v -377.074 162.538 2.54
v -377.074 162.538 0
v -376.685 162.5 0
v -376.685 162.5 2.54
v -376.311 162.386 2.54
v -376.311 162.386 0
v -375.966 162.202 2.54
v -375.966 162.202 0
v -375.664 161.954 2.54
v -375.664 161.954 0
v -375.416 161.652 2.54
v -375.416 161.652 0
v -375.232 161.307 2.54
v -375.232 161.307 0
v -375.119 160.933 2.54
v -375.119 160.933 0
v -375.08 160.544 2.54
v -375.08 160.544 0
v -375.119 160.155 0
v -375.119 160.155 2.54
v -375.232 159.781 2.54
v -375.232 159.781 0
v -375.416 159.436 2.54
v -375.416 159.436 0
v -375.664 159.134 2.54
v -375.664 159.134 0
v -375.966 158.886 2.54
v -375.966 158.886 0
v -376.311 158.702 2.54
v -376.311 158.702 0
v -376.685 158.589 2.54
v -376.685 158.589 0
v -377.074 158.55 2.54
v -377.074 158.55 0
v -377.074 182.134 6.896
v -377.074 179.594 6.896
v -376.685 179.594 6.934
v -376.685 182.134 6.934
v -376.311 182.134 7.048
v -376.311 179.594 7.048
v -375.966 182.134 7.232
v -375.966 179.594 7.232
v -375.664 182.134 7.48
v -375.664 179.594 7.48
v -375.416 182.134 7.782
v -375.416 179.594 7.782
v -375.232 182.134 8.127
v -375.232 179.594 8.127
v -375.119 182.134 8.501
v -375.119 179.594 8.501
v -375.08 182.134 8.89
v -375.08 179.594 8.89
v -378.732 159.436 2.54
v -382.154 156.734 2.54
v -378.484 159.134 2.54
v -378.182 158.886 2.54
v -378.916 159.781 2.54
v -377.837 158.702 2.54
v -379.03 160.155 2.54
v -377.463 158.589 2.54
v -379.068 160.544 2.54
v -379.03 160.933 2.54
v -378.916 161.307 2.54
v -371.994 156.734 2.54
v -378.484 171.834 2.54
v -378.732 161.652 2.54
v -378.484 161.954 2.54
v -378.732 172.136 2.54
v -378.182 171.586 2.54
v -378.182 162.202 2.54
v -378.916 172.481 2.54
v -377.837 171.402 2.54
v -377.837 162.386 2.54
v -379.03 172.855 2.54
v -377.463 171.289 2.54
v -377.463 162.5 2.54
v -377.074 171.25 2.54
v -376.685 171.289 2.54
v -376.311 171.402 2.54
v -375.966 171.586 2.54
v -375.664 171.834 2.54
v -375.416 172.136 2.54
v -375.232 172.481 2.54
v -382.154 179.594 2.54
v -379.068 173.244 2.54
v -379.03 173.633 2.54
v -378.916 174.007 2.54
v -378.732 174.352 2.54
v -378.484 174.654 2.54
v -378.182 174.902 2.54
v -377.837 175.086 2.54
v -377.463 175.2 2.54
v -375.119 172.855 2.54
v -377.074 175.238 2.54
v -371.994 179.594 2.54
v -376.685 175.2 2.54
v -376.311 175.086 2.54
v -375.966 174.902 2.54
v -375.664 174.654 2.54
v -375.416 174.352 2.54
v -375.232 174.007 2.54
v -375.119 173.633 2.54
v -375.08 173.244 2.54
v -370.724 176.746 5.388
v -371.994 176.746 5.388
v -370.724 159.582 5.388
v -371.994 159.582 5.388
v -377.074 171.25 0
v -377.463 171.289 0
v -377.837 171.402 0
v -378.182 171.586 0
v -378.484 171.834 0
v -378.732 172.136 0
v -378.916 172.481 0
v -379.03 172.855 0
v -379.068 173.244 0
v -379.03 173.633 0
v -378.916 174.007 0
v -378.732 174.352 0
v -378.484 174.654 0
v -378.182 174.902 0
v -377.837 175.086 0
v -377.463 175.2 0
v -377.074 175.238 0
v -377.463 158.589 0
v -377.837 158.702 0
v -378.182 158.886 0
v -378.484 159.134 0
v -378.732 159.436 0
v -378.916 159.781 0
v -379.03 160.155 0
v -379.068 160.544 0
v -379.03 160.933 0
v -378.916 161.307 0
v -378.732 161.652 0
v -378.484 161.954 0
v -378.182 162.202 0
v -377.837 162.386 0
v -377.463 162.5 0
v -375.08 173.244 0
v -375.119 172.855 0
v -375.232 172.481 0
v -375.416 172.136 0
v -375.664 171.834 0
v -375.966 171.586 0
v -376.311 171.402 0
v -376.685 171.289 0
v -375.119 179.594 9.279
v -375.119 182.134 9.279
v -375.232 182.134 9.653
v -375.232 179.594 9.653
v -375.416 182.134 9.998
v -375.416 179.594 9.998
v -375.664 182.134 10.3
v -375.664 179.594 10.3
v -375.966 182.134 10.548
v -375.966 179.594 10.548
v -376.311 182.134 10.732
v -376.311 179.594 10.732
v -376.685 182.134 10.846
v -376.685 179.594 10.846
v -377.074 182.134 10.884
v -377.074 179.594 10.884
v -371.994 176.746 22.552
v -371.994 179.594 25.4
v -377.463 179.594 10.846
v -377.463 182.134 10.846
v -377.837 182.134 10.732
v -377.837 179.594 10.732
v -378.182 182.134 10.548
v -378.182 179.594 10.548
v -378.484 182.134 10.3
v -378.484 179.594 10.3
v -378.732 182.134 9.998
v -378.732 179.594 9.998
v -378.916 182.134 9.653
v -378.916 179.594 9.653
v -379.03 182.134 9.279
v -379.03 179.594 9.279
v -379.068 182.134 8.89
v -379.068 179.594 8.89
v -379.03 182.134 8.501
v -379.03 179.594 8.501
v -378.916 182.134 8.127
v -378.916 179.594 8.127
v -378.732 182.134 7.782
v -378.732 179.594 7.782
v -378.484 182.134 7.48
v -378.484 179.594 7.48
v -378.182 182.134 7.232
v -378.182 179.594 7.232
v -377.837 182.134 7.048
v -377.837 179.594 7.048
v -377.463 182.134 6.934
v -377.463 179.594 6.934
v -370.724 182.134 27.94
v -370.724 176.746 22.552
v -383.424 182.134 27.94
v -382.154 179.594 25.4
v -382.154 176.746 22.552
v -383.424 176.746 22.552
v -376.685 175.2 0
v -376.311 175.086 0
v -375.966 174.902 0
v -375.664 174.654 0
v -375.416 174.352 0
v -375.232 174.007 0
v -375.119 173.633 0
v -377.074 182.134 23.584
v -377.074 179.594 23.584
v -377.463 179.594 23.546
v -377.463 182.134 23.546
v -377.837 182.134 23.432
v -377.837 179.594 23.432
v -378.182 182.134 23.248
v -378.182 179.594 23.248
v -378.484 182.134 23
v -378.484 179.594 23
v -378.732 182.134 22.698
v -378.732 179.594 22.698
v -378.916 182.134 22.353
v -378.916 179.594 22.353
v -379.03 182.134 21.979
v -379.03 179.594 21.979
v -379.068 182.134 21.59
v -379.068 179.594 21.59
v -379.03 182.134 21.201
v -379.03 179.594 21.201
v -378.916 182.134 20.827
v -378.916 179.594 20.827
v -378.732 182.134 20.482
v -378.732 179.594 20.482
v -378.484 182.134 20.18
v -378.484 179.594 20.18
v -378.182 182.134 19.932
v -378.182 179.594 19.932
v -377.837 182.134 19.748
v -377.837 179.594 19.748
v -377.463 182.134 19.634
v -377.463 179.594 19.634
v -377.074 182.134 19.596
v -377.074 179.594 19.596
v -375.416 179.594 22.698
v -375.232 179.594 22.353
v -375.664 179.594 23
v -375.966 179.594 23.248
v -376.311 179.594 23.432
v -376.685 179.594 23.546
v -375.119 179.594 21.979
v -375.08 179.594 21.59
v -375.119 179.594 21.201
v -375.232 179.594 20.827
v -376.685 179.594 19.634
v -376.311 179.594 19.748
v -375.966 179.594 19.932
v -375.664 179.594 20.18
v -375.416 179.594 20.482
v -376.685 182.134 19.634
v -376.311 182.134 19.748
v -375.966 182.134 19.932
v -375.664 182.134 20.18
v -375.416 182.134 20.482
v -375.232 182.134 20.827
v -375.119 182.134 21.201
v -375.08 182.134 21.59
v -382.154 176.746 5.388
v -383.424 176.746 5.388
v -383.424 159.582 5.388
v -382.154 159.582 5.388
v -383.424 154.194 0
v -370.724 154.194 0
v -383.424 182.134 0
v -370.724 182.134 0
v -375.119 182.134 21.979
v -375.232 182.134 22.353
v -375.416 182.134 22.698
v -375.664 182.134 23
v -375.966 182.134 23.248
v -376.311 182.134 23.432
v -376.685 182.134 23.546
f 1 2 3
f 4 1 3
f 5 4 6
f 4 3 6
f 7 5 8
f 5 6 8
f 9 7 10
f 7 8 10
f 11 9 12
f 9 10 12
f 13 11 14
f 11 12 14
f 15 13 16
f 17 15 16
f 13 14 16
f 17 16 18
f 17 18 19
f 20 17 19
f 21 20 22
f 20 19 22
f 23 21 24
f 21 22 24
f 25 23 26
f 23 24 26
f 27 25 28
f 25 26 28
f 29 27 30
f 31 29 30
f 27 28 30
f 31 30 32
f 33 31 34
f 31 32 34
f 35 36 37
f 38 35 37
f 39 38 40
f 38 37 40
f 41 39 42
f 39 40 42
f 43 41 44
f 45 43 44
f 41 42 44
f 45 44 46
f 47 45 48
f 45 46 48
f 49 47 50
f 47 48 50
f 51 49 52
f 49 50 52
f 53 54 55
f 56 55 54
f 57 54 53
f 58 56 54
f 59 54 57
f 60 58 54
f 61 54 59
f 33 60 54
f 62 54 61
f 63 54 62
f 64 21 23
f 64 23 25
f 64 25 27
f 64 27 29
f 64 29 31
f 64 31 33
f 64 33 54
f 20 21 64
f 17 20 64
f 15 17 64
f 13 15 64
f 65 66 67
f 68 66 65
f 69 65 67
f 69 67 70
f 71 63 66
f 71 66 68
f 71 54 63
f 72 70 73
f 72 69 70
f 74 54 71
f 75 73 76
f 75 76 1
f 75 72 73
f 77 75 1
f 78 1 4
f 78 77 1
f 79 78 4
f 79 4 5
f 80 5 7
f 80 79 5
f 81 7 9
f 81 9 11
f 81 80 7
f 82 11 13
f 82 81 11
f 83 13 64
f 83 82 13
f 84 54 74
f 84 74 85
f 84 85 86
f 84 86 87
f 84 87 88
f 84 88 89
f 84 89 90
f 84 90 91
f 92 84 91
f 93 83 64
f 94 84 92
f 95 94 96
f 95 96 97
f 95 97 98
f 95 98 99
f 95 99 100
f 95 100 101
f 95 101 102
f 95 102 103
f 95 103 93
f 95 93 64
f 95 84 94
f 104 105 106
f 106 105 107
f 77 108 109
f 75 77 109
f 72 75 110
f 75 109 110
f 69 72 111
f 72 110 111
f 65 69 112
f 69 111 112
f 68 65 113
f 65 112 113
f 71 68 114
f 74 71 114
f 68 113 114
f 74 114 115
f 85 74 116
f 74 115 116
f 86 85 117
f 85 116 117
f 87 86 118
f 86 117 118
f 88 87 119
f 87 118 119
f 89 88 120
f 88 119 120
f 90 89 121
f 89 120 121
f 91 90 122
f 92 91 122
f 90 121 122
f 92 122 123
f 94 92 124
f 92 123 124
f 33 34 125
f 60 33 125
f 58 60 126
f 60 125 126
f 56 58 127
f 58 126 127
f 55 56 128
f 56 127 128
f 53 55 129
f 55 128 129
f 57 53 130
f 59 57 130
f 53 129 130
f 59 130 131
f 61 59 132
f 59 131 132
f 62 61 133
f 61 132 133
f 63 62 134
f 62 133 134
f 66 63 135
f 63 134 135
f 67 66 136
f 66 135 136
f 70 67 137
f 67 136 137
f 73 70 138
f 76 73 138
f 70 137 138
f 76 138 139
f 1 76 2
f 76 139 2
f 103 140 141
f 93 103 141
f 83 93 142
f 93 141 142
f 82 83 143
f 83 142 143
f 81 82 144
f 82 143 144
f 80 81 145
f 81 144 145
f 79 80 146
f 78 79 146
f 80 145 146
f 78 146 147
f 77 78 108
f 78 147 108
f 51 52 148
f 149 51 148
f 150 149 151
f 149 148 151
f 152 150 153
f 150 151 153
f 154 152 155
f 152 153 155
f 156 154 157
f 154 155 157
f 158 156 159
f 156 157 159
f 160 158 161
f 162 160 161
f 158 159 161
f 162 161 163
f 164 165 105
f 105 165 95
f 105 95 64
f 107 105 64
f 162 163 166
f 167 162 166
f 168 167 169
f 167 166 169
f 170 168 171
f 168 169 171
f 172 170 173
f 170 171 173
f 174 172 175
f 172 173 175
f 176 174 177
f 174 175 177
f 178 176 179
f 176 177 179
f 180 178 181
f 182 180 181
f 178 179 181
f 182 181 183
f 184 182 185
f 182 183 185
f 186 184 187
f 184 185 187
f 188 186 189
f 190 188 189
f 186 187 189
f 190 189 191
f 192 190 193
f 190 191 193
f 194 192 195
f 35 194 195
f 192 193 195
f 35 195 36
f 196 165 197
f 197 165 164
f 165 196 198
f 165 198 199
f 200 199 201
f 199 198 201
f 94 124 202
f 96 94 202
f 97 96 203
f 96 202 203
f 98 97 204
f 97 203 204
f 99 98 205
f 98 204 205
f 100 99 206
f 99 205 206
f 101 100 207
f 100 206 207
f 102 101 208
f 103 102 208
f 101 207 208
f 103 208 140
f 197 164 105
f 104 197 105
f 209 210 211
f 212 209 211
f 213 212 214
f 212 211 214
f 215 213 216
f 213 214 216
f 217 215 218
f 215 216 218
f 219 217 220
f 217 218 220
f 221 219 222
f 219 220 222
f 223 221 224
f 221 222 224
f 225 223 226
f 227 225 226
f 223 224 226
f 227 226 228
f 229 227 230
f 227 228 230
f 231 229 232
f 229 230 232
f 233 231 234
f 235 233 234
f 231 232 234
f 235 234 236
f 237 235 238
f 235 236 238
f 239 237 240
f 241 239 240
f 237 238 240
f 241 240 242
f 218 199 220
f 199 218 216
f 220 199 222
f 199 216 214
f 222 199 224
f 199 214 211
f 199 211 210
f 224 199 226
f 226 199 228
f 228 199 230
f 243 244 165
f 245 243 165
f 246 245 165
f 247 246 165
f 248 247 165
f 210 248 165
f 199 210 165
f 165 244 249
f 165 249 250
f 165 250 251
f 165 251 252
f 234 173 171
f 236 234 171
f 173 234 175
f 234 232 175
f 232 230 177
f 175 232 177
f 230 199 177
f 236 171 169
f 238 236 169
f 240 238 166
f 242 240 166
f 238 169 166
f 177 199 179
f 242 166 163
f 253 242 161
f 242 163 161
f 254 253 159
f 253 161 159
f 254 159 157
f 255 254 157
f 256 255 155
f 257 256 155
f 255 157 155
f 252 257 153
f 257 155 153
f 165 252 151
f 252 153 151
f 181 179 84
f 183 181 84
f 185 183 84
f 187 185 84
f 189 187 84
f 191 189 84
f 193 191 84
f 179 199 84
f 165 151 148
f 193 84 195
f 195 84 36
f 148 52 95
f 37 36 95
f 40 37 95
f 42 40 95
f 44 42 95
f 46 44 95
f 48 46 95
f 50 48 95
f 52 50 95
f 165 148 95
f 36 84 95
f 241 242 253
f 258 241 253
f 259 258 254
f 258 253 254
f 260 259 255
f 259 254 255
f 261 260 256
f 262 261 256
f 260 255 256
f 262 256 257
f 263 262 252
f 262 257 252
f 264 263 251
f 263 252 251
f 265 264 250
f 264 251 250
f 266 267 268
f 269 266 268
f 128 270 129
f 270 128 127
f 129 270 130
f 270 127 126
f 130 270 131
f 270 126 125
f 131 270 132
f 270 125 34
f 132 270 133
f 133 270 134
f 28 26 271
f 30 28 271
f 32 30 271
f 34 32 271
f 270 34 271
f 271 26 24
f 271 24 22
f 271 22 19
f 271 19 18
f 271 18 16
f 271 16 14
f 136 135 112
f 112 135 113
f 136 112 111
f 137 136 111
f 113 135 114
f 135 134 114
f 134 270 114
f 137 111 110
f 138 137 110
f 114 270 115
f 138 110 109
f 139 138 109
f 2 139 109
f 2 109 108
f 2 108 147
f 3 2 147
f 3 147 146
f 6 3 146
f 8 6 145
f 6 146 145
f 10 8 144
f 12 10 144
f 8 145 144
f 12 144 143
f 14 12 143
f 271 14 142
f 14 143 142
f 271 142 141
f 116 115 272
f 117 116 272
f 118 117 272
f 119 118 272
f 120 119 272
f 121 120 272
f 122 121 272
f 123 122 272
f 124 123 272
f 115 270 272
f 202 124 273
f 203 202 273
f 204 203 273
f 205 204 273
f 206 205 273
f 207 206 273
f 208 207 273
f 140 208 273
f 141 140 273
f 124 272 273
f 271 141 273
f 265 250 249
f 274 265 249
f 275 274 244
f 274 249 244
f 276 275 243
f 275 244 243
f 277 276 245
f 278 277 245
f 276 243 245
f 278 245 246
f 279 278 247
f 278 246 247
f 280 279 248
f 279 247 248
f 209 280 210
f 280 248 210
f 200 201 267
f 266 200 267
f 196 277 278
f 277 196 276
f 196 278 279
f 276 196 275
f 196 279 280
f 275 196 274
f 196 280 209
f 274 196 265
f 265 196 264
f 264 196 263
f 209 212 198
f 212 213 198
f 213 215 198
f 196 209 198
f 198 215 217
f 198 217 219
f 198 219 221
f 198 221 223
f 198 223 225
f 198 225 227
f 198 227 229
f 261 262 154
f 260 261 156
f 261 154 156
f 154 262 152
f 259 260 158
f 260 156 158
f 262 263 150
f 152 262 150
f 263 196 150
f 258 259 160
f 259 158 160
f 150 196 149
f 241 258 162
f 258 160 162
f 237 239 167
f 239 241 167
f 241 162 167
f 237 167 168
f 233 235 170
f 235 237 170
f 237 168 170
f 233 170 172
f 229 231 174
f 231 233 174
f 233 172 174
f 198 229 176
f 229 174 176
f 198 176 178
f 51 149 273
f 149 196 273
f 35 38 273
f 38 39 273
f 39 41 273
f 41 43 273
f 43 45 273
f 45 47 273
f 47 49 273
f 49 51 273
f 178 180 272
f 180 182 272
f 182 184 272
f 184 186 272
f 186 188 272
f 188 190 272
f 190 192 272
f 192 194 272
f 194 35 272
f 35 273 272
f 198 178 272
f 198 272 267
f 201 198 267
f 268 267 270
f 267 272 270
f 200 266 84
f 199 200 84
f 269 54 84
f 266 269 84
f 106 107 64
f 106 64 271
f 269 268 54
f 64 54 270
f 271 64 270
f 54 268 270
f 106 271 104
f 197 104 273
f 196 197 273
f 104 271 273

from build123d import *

# Parameters (mm, degrees)
F1_DEPTH = 2.54
F0_W     = 1.27
F0_H     = 9.02178
F2_DEPTH = 27.94
F4_DEPTH = 25.4
F6_DEPTH = 38.1


with BuildPart() as f1:
    # F0 (on Top) → F1 (new body)
    with BuildSketch(Plane.XY):
        with BuildLine():
            Line((-382.154137, 163.215905), (-382.154137, 154.194125))
            Line((-382.154137, 154.194125), (-377.074137, 154.194125))
            Line((-377.074137, 154.194125), (-377.074137, 158.550225))
            ThreePointArc((-377.074137, 158.550225), (-379.068037, 160.544125), (-377.074137, 162.538025))
            Line((-377.074137, 162.538025), (-377.074137, 171.250225))
            ThreePointArc((-377.074137, 171.250225), (-379.068037, 173.244125), (-377.074137, 175.238025))
            Line((-377.074137, 175.238025), (-377.074137, 179.594125))
            Line((-377.074137, 179.594125), (-382.154137, 179.594125))
            Line((-382.154137, 179.594125), (-382.154137, 163.215905))
        make_face()
        with BuildLine():
            Line((-377.074137, 158.550225), (-377.074137, 154.194125))
            Line((-377.074137, 154.194125), (-371.994137, 154.194125))
            Line((-371.994137, 154.194125), (-371.994137, 179.594125))
            Line((-371.994137, 179.594125), (-377.074137, 179.594125))
            Line((-377.074137, 179.594125), (-377.074137, 175.238025))
            ThreePointArc((-377.074137, 175.238025), (-375.664237, 174.654025), (-375.080237, 173.244125))
            ThreePointArc((-375.080237, 173.244125), (-375.664237, 171.834224), (-377.074137, 171.250225))
            Line((-377.074137, 171.250225), (-377.074137, 162.538025))
            ThreePointArc((-377.074137, 162.538025), (-375.664237, 161.954025), (-375.080237, 160.544125))
            ThreePointArc((-375.080237, 160.544125), (-375.664237, 159.134224), (-377.074137, 158.550225))
        make_face()
    extrude(amount=F1_DEPTH)

    # F0 (on Top) → F2 (join)
    with BuildSketch(Plane.XY):
        Polygon((-383.424137, 182.134125), (-383.424137, 163.215905), (-382.154137, 163.215905), (-382.154137, 179.594125), (-377.074137, 179.594125), (-377.074137, 182.134125), align=None)
        Polygon((-371.994137, 179.594125), (-371.994137, 154.194125), (-370.724137, 154.194125), (-370.724137, 182.134125), (-377.074137, 182.134125), (-377.074137, 179.594125), align=None)
        with Locations((-382.789137, 158.705015)):
            Rectangle(F0_W, F0_H)
    extrude(amount=F2_DEPTH)

    # F3 (on face) → F4 (cut)
    with BuildSketch(Plane.XZ.offset(-179.594125)):
        with BuildLine():
            Line((-377.074137, 21.59), (-377.074137, 19.5961))
            ThreePointArc((-377.074137, 19.5961), (-375.664237, 20.1801), (-375.080237, 21.59))
            ThreePointArc((-375.080237, 21.59), (-375.664237, 22.9999), (-377.074137, 23.5839))
            Line((-377.074137, 23.5839), (-377.074137, 21.59))
        make_face()
        with BuildLine():
            ThreePointArc((-377.074137, 23.5839), (-379.068037, 21.59), (-377.074137, 19.5961))
            Line((-377.074137, 19.5961), (-377.074137, 21.59))
            Line((-377.074137, 21.59), (-377.074137, 23.5839))
        make_face()
        with BuildLine():
            ThreePointArc((-377.074137, 10.8839), (-379.068037, 8.89), (-377.074137, 6.8961))
            Line((-377.074137, 6.8961), (-377.074137, 8.89))
            Line((-377.074137, 8.89), (-377.074137, 10.8839))
        make_face()
        with BuildLine():
            Line((-377.074137, 8.89), (-377.074137, 6.8961))
            ThreePointArc((-377.074137, 6.8961), (-375.664237, 7.4801), (-375.080237, 8.89))
            ThreePointArc((-375.080237, 8.89), (-375.664237, 10.2999), (-377.074137, 10.8839))
            Line((-377.074137, 10.8839), (-377.074137, 8.89))
        make_face()
    extrude(amount=-F4_DEPTH, mode=Mode.SUBTRACT)

    # F5 (on face) → F6 (cut)
    with BuildSketch(Plane(origin=(-383.424137, 0, 0), x_dir=(0, -1, 0), z_dir=(-1, 0, 0))):
        Polygon((-159.582278, 5.388154), (-154.194125, 0), (-154.194125, 27.94), (-182.134125, 27.94), (-176.745971, 22.551846), (-176.745971, 5.388154), align=None)
    extrude(amount=-F6_DEPTH, mode=Mode.SUBTRACT)


solid = f1.part
